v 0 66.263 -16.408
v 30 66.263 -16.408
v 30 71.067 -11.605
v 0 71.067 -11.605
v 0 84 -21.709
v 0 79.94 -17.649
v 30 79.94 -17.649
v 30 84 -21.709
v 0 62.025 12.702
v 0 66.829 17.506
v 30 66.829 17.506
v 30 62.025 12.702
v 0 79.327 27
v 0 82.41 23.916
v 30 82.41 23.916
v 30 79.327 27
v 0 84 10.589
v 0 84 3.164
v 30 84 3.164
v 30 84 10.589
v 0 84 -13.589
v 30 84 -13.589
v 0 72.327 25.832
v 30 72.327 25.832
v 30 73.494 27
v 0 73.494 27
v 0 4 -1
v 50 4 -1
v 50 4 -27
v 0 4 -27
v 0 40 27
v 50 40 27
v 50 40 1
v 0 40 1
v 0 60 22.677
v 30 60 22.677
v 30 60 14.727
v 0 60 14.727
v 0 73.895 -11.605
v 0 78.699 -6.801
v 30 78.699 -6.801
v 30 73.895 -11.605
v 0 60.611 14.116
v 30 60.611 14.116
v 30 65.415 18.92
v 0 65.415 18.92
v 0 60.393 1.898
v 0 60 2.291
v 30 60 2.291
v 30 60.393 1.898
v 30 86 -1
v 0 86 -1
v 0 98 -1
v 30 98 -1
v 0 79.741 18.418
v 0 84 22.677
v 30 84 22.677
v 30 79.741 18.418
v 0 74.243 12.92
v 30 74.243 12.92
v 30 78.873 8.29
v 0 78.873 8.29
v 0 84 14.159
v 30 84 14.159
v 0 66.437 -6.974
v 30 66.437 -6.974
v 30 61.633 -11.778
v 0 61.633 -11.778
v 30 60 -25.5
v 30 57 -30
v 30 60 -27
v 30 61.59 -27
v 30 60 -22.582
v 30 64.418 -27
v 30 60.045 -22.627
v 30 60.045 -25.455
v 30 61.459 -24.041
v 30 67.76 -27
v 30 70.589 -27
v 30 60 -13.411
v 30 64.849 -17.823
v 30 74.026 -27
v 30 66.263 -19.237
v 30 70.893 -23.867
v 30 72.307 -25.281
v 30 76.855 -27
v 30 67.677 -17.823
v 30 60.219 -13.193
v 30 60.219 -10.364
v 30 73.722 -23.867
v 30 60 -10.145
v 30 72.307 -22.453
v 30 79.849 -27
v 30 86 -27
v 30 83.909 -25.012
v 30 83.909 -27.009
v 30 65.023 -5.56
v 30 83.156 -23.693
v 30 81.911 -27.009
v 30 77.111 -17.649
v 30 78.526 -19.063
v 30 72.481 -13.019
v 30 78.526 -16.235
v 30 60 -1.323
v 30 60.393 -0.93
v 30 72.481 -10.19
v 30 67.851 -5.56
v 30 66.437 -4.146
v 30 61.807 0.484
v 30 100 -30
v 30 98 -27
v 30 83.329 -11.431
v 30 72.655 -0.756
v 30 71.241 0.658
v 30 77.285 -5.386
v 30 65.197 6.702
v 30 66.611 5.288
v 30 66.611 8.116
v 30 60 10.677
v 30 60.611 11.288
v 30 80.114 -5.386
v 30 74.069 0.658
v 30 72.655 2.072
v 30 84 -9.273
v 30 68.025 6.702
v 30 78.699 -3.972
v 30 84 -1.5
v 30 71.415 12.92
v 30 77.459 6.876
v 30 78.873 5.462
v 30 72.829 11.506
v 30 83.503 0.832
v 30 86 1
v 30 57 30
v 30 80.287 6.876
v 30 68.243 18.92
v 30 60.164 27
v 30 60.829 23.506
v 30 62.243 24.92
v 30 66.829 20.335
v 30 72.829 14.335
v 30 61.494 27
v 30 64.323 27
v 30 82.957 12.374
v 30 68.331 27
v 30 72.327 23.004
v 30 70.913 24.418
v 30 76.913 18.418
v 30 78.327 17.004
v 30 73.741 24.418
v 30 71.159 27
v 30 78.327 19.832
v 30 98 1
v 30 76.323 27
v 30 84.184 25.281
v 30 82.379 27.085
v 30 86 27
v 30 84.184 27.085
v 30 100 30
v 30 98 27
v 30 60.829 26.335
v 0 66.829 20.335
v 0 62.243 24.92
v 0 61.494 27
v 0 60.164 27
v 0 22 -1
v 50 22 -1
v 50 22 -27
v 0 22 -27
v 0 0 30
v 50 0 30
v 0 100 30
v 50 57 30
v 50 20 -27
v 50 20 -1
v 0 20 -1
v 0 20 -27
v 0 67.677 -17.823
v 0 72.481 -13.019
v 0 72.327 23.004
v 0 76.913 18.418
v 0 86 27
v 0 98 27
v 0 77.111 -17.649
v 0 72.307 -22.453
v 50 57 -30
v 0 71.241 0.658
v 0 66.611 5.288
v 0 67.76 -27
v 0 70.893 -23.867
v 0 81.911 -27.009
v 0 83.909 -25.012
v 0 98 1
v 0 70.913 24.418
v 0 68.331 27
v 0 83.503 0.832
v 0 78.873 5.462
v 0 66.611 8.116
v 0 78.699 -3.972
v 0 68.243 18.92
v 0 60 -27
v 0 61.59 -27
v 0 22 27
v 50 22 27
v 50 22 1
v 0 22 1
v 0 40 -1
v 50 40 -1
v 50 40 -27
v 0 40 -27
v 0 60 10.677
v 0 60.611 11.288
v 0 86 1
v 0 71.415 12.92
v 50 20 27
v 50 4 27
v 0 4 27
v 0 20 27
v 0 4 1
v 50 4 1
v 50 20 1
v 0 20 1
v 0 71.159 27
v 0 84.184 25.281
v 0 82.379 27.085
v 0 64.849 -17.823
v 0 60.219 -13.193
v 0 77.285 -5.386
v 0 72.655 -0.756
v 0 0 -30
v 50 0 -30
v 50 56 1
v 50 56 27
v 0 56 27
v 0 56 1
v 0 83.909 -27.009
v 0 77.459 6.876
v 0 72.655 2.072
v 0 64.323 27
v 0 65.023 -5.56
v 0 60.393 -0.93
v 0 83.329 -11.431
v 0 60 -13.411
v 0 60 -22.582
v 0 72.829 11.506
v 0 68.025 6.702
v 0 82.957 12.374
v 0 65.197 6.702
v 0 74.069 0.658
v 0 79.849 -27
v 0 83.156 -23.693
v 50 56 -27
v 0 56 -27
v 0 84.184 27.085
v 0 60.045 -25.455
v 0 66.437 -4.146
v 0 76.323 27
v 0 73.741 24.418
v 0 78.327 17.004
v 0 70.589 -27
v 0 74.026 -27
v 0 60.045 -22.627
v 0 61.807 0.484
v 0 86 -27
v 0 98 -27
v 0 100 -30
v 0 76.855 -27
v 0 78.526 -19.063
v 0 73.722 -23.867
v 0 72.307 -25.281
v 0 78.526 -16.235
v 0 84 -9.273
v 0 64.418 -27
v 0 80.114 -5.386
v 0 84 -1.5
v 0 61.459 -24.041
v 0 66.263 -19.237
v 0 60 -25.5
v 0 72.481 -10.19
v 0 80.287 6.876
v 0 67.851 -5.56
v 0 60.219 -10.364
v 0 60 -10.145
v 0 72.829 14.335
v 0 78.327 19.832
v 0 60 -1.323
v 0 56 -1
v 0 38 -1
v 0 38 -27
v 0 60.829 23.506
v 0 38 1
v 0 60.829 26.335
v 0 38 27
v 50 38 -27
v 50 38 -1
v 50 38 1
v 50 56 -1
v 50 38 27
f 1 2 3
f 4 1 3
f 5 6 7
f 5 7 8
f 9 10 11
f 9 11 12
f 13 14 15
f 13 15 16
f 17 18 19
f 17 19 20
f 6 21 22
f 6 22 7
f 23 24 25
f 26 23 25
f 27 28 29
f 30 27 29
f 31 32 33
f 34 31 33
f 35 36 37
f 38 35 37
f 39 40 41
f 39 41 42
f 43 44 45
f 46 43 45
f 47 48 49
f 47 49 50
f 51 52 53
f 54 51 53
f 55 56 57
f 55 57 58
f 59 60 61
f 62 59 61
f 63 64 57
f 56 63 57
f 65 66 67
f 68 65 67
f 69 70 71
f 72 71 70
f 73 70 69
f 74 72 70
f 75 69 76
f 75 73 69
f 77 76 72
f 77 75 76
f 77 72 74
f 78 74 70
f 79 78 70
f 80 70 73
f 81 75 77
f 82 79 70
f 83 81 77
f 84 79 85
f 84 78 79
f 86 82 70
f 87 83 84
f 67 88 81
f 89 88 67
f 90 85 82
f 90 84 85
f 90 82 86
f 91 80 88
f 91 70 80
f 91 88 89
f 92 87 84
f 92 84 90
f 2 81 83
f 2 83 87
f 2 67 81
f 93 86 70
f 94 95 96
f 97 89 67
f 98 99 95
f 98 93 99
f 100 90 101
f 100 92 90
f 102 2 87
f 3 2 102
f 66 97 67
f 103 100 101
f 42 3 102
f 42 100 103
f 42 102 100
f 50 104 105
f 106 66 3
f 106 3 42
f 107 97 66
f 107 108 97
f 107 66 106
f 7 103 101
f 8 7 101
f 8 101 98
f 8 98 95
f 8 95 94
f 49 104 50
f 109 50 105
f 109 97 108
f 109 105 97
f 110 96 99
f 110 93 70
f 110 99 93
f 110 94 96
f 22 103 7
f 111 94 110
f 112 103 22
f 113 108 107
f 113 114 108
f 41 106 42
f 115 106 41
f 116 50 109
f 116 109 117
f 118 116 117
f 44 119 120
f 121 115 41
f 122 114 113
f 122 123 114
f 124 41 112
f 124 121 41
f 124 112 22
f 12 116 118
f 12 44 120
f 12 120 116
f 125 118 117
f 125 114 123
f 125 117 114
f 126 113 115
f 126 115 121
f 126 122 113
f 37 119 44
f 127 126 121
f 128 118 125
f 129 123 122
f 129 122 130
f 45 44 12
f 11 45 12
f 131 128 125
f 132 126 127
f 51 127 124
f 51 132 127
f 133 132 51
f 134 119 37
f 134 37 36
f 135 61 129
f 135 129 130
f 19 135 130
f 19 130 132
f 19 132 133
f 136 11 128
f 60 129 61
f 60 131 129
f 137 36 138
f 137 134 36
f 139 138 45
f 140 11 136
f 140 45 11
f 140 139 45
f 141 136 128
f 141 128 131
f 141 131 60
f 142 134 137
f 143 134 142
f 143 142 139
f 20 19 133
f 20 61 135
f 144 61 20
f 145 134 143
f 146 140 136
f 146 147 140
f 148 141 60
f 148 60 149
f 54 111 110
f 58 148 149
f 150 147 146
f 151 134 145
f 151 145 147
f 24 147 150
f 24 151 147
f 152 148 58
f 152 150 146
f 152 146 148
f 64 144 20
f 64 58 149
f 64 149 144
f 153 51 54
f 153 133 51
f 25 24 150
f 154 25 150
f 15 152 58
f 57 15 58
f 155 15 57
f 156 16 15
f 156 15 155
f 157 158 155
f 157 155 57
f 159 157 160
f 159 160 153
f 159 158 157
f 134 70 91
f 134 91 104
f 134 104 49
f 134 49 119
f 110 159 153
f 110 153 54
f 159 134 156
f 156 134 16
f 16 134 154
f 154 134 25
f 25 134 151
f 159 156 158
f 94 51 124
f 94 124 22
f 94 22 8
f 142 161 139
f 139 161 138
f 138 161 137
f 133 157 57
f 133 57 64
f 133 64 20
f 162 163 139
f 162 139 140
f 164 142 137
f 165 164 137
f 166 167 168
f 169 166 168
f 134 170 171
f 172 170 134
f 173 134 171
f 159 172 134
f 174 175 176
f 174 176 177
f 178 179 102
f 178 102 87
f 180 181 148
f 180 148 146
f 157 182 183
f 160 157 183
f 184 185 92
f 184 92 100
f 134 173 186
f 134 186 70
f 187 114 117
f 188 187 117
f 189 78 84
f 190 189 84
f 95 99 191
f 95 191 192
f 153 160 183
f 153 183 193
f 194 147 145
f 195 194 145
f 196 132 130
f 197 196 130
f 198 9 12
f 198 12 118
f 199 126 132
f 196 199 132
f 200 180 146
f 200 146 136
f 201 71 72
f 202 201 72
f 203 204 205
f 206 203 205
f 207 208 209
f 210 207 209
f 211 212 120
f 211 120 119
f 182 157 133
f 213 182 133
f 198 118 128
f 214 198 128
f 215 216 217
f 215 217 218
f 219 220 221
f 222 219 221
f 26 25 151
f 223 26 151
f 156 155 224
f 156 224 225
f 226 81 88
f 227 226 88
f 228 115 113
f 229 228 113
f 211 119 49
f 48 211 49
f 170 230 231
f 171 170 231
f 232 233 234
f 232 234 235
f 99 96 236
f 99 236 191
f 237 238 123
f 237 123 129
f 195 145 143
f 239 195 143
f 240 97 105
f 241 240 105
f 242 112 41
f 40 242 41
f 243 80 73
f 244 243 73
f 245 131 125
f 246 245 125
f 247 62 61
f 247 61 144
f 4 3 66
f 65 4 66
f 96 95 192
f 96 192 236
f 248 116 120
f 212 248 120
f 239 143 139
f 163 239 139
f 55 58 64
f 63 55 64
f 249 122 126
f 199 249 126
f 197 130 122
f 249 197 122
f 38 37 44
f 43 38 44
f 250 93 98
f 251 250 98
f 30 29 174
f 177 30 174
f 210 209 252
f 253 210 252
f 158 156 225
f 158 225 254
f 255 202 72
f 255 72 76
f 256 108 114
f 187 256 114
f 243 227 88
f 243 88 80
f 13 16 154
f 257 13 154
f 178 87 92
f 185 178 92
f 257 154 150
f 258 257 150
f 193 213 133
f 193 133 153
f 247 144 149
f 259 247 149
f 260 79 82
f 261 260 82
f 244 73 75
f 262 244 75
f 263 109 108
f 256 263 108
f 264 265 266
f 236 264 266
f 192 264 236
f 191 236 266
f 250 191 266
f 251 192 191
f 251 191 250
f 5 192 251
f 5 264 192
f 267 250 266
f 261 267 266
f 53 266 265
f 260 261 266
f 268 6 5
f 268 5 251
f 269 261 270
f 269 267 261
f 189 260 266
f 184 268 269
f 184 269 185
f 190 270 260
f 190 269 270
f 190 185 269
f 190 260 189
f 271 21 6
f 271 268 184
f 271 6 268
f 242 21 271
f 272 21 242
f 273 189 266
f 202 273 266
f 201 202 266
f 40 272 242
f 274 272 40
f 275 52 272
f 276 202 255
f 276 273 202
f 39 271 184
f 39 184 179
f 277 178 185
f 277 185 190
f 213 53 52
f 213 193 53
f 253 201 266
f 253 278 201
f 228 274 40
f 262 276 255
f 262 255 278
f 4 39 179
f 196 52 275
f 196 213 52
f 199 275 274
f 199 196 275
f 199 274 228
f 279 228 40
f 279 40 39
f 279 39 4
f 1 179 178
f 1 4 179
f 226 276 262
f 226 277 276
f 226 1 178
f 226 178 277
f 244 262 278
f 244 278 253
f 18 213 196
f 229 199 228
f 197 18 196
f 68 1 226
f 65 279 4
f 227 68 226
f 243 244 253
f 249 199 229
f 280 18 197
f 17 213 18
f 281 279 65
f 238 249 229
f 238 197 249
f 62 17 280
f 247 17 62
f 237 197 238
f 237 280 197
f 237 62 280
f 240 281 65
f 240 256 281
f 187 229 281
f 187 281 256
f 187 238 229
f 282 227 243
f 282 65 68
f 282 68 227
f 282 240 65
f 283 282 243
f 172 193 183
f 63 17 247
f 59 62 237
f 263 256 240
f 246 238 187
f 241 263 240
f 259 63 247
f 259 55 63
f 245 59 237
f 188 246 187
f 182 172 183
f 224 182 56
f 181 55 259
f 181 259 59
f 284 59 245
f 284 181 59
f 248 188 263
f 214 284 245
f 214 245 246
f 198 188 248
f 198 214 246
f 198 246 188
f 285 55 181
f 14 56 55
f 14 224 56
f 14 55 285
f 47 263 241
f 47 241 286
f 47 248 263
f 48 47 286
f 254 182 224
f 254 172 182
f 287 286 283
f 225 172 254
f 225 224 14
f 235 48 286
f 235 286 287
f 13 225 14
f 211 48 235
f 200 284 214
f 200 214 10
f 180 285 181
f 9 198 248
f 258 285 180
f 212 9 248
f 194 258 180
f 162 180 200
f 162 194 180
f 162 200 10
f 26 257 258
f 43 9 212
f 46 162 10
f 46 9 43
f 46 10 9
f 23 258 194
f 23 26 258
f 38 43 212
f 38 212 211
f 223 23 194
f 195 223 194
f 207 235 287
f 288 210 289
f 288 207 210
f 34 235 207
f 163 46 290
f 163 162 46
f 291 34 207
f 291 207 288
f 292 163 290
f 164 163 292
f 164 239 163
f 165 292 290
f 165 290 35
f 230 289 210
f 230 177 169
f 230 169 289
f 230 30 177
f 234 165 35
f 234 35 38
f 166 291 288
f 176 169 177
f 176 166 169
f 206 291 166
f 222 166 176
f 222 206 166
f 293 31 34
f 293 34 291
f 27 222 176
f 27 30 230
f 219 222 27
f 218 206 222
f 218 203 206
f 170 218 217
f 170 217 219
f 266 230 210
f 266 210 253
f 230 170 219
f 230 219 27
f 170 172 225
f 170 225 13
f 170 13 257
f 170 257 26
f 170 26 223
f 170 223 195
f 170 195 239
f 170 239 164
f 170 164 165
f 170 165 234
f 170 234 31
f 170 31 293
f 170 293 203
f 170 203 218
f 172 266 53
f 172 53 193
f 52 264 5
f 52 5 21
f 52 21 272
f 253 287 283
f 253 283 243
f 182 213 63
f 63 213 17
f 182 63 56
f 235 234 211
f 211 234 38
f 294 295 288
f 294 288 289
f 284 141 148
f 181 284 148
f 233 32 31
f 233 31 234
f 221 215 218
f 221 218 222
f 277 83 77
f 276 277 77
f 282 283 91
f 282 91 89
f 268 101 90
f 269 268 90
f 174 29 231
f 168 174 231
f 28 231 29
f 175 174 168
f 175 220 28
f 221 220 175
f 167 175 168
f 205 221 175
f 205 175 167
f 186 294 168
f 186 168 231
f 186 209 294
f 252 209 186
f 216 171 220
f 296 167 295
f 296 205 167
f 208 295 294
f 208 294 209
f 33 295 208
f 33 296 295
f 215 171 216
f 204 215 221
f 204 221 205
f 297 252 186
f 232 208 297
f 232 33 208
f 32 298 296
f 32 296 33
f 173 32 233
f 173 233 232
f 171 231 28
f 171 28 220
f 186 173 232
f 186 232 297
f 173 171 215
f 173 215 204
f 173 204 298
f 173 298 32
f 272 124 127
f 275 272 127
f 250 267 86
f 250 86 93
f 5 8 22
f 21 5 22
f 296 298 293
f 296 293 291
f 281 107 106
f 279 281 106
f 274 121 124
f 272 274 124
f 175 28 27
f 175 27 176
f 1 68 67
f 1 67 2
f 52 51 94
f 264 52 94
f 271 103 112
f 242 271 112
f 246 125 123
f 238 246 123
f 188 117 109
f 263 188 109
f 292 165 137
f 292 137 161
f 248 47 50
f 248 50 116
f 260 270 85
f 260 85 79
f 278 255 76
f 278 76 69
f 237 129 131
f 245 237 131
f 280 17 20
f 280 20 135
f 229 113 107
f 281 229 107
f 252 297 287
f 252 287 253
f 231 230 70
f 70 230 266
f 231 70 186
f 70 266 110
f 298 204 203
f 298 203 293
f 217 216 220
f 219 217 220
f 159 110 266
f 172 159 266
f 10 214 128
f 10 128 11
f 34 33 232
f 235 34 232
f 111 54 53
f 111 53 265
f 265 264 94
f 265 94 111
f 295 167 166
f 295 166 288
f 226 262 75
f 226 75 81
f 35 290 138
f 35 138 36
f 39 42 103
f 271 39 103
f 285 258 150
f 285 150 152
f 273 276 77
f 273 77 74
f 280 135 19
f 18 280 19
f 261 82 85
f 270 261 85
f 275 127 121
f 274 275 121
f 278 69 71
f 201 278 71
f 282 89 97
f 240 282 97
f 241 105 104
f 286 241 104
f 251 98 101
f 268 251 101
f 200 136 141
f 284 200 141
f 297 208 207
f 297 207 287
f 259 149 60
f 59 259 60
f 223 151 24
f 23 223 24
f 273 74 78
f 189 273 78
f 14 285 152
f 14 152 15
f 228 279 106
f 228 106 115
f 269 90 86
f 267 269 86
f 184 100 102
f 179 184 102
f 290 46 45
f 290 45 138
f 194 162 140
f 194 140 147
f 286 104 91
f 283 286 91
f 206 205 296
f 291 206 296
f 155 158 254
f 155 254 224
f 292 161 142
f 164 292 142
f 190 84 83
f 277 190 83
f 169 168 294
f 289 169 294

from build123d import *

# Parameters (mm, degrees)
SALIENTE_EXTRUIR1_DEPTH = 30
CROQUIS2_W              = 26
CROQUIS2_H              = 16
CORTAR_EXTRUIR1_DEPTH   = 51
CROQUIS3_W              = 26
CROQUIS3_H              = 12
CORTAR_EXTRUIR2_DEPTH   = 31
CORTAR_EXTRUIR4_DEPTH   = 31
CORTAR_EXTRUIR5_DEPTH   = 31
CORTAR_EXTRUIR6_DEPTH   = 31


with BuildPart() as part:
    # Croquis1 → Saliente-Extruir1 (new body, symmetric)
    with BuildSketch(Plane.XY):
        Polygon((0, 0), (50, 0), (50, 57), (30, 57), (30, 100), (0, 100), align=None)
    extrude(amount=SALIENTE_EXTRUIR1_DEPTH, both=True)

    # Croquis2 → Cortar-Extruir1 (cut, through all)
    with BuildSketch(Plane(origin=(50, 0, 0), x_dir=(0, 0, -1), z_dir=(1, 0, 0))):
        with Locations((-14, 48)):
            Rectangle(CROQUIS2_W, CROQUIS2_H)
        with Locations((14, 48)):
            Rectangle(CROQUIS2_W, CROQUIS2_H)
        with Locations((-14, 30)):
            Rectangle(CROQUIS2_W, CROQUIS2_H)
        with Locations((14, 30)):
            Rectangle(CROQUIS2_W, CROQUIS2_H)
        with Locations((-14, 12)):
            Rectangle(CROQUIS2_W, CROQUIS2_H)
        with Locations((14, 12)):
            Rectangle(CROQUIS2_W, CROQUIS2_H)
    extrude(amount=-CORTAR_EXTRUIR1_DEPTH, mode=Mode.SUBTRACT)

    # Croquis3 → Cortar-Extruir2 (cut, through all)
    with BuildSketch(Plane(origin=(30, 0, 0), x_dir=(0, 0, -1), z_dir=(1, 0, 0))):
        with Locations((-14, 92)):
            Rectangle(CROQUIS3_W, CROQUIS3_H)
        with Locations((14, 92)):
            Rectangle(CROQUIS3_W, CROQUIS3_H)
    extrude(amount=-CORTAR_EXTRUIR2_DEPTH, mode=Mode.SUBTRACT)

    # Croquis4 → Cortar-Extruir4 (cut, through all)
    with BuildSketch(Plane(origin=(30, 0, 0), x_dir=(0, 0, -1), z_dir=(1, 0, 0))):
        Polygon((-23.506160606, 60.828952145), (-22.677208461, 60), (-14.727245643, 60), (-14.116440614, 60.610805028), (-14.166440614, 60.660805028), (-14.216440614, 60.710805028), (-18.920374168, 65.414738582), align=None)
        Polygon((-12.920374168, 71.414738582), (-17.506160606, 66.828952145), (-12.702227052, 62.025018591), (-8.116440614, 66.610805028), align=None)
        Polygon((-6.876072053, 77.459040697), (-11.506160606, 72.828952145), (-6.702227052, 68.025018591), (-2.072138499, 72.655107144), align=None)
        Polygon((-0.831769938, 83.503342813), (-5.46185849, 78.87325426), (-0.657924937, 74.069320706), (3.972163616, 78.699409259), align=None)
        Polygon((1.5, 84), (5.386377179, 80.113622821), (9.272754357, 84), align=None)
        Polygon((-14.159291936, 84), (-22.677208461, 84), (-18.418250198, 79.741041737), align=None)
        Polygon((-10.588604231, 84), (-6.876072053, 80.287467822), (-3.163539875, 84), align=None)
        Polygon((-17.004036636, 78.326828175), (-12.920374168, 74.243165707), (-8.290285615, 78.87325426), (-12.373948083, 82.956916728), align=None)
        Polygon((-23.004036636, 72.326828175), (-18.920374168, 68.243165707), (-14.33458773, 72.828952145), (-18.418250198, 76.912614613), align=None)
        Polygon((-27, 64.322791539), (-24.920374168, 62.243165707), (-20.33458773, 66.828952145), (-24.418250198, 70.912614613), (-27, 68.330864811), align=None)
        Polygon((-27, 61.494364414), (-27, 60.263539875), (-27, 60.163539875), (-26.33458773, 60.828952145), align=None)
        Polygon((27, 67.760177106), (23.866973526, 70.89320358), (19.236884973, 66.263115027), (24.040818527, 61.459181473), (27, 64.418362946), align=None)
        Polygon((13.588604231, 84), (17.64882641, 79.939777821), (21.709048589, 84), align=None)
        Polygon((11.430679294, 83.329497812), (6.800590741, 78.699409259), (11.604524295, 73.895475705), (16.234612848, 78.525564258), align=None)
        Polygon((5.386377179, 77.285195697), (0.756288626, 72.655107144), (5.560222179, 67.85117359), (10.190310732, 72.481262143), align=None)
        Polygon((-0.657924937, 71.240893581), (-5.28801349, 66.610805028), (-0.484079936, 61.806871475), (4.146008617, 66.436960028), align=None)
        Polygon((-1.948293498, 60.442657912), (-1.998293498, 60.492657912), (-6.702227052, 65.196591466), (-11.28801349, 60.610805028), (-10.677208461, 60), (-2.290951411, 60), (-1.898293498, 60.392657912), align=None)
        Polygon((27, 79.848781336), (23.693128525, 83.155652811), (19.063039972, 78.525564258), (23.866973526, 73.721630704), (27, 76.854657178), align=None)
        Polygon((10.364155733, 60.218812911), (10.314155733, 60.268812911), (5.560222179, 65.022746465), (0.930133627, 60.392657912), (1.322791539, 60), (10.145342822, 60), align=None)
        Polygon((17.64882641, 77.111350696), (13.018737857, 72.481262143), (17.822671411, 67.677328589), (22.452759964, 72.307417142), align=None)
        Polygon((11.604524295, 71.067048581), (6.974435742, 66.436960028), (11.778369296, 61.633026474), (16.408457848, 66.263115027), align=None)
        Polygon((-27, 79.326616872), (-27, 76.322791539), (-24.418250198, 73.741041737), (-19.832463761, 78.326828175), (-23.916126229, 82.410490643), align=None)
        Polygon((22.581637054, 60), (22.626604965, 60.044967911), (17.822671411, 64.848901464), (13.192582858, 60.218812911), (13.411395769, 60), align=None)
        Polygon((-27, 71.159291936), (-25.832463761, 72.326828175), (-27, 73.494364414), align=None)
        Polygon((27, 74.026230054), (25.281187089, 72.307417142), (27, 70.588604231), align=None)
        Polygon((27, 61.589935821), (25.455032089, 60.044967911), (25.5, 60), (27, 60), align=None)
    extrude(amount=-CORTAR_EXTRUIR4_DEPTH, mode=Mode.SUBTRACT)

    # Croquis5 → Cortar-Extruir5 (cut, through all)
    with BuildSketch(Plane(origin=(30, 0, 0), x_dir=(0, 0, -1), z_dir=(1, 0, 0))):
        Polygon((-27.085333176, 82.379183427), (-27.085333176, 84.183862587), (-25.280654015, 84.183862587), align=None)
    extrude(amount=-CORTAR_EXTRUIR5_DEPTH, mode=Mode.SUBTRACT)

    # Croquis6 → Cortar-Extruir6 (cut, through all)
    with BuildSketch(Plane(origin=(30, 0, 0), x_dir=(0, 0, -1), z_dir=(1, 0, 0))):
        Polygon((27.009208932, 83.908640009), (27.009208932, 81.911495936), (25.012064859, 83.908640009), align=None)
    extrude(amount=-CORTAR_EXTRUIR6_DEPTH, mode=Mode.SUBTRACT)


solid = part.part
